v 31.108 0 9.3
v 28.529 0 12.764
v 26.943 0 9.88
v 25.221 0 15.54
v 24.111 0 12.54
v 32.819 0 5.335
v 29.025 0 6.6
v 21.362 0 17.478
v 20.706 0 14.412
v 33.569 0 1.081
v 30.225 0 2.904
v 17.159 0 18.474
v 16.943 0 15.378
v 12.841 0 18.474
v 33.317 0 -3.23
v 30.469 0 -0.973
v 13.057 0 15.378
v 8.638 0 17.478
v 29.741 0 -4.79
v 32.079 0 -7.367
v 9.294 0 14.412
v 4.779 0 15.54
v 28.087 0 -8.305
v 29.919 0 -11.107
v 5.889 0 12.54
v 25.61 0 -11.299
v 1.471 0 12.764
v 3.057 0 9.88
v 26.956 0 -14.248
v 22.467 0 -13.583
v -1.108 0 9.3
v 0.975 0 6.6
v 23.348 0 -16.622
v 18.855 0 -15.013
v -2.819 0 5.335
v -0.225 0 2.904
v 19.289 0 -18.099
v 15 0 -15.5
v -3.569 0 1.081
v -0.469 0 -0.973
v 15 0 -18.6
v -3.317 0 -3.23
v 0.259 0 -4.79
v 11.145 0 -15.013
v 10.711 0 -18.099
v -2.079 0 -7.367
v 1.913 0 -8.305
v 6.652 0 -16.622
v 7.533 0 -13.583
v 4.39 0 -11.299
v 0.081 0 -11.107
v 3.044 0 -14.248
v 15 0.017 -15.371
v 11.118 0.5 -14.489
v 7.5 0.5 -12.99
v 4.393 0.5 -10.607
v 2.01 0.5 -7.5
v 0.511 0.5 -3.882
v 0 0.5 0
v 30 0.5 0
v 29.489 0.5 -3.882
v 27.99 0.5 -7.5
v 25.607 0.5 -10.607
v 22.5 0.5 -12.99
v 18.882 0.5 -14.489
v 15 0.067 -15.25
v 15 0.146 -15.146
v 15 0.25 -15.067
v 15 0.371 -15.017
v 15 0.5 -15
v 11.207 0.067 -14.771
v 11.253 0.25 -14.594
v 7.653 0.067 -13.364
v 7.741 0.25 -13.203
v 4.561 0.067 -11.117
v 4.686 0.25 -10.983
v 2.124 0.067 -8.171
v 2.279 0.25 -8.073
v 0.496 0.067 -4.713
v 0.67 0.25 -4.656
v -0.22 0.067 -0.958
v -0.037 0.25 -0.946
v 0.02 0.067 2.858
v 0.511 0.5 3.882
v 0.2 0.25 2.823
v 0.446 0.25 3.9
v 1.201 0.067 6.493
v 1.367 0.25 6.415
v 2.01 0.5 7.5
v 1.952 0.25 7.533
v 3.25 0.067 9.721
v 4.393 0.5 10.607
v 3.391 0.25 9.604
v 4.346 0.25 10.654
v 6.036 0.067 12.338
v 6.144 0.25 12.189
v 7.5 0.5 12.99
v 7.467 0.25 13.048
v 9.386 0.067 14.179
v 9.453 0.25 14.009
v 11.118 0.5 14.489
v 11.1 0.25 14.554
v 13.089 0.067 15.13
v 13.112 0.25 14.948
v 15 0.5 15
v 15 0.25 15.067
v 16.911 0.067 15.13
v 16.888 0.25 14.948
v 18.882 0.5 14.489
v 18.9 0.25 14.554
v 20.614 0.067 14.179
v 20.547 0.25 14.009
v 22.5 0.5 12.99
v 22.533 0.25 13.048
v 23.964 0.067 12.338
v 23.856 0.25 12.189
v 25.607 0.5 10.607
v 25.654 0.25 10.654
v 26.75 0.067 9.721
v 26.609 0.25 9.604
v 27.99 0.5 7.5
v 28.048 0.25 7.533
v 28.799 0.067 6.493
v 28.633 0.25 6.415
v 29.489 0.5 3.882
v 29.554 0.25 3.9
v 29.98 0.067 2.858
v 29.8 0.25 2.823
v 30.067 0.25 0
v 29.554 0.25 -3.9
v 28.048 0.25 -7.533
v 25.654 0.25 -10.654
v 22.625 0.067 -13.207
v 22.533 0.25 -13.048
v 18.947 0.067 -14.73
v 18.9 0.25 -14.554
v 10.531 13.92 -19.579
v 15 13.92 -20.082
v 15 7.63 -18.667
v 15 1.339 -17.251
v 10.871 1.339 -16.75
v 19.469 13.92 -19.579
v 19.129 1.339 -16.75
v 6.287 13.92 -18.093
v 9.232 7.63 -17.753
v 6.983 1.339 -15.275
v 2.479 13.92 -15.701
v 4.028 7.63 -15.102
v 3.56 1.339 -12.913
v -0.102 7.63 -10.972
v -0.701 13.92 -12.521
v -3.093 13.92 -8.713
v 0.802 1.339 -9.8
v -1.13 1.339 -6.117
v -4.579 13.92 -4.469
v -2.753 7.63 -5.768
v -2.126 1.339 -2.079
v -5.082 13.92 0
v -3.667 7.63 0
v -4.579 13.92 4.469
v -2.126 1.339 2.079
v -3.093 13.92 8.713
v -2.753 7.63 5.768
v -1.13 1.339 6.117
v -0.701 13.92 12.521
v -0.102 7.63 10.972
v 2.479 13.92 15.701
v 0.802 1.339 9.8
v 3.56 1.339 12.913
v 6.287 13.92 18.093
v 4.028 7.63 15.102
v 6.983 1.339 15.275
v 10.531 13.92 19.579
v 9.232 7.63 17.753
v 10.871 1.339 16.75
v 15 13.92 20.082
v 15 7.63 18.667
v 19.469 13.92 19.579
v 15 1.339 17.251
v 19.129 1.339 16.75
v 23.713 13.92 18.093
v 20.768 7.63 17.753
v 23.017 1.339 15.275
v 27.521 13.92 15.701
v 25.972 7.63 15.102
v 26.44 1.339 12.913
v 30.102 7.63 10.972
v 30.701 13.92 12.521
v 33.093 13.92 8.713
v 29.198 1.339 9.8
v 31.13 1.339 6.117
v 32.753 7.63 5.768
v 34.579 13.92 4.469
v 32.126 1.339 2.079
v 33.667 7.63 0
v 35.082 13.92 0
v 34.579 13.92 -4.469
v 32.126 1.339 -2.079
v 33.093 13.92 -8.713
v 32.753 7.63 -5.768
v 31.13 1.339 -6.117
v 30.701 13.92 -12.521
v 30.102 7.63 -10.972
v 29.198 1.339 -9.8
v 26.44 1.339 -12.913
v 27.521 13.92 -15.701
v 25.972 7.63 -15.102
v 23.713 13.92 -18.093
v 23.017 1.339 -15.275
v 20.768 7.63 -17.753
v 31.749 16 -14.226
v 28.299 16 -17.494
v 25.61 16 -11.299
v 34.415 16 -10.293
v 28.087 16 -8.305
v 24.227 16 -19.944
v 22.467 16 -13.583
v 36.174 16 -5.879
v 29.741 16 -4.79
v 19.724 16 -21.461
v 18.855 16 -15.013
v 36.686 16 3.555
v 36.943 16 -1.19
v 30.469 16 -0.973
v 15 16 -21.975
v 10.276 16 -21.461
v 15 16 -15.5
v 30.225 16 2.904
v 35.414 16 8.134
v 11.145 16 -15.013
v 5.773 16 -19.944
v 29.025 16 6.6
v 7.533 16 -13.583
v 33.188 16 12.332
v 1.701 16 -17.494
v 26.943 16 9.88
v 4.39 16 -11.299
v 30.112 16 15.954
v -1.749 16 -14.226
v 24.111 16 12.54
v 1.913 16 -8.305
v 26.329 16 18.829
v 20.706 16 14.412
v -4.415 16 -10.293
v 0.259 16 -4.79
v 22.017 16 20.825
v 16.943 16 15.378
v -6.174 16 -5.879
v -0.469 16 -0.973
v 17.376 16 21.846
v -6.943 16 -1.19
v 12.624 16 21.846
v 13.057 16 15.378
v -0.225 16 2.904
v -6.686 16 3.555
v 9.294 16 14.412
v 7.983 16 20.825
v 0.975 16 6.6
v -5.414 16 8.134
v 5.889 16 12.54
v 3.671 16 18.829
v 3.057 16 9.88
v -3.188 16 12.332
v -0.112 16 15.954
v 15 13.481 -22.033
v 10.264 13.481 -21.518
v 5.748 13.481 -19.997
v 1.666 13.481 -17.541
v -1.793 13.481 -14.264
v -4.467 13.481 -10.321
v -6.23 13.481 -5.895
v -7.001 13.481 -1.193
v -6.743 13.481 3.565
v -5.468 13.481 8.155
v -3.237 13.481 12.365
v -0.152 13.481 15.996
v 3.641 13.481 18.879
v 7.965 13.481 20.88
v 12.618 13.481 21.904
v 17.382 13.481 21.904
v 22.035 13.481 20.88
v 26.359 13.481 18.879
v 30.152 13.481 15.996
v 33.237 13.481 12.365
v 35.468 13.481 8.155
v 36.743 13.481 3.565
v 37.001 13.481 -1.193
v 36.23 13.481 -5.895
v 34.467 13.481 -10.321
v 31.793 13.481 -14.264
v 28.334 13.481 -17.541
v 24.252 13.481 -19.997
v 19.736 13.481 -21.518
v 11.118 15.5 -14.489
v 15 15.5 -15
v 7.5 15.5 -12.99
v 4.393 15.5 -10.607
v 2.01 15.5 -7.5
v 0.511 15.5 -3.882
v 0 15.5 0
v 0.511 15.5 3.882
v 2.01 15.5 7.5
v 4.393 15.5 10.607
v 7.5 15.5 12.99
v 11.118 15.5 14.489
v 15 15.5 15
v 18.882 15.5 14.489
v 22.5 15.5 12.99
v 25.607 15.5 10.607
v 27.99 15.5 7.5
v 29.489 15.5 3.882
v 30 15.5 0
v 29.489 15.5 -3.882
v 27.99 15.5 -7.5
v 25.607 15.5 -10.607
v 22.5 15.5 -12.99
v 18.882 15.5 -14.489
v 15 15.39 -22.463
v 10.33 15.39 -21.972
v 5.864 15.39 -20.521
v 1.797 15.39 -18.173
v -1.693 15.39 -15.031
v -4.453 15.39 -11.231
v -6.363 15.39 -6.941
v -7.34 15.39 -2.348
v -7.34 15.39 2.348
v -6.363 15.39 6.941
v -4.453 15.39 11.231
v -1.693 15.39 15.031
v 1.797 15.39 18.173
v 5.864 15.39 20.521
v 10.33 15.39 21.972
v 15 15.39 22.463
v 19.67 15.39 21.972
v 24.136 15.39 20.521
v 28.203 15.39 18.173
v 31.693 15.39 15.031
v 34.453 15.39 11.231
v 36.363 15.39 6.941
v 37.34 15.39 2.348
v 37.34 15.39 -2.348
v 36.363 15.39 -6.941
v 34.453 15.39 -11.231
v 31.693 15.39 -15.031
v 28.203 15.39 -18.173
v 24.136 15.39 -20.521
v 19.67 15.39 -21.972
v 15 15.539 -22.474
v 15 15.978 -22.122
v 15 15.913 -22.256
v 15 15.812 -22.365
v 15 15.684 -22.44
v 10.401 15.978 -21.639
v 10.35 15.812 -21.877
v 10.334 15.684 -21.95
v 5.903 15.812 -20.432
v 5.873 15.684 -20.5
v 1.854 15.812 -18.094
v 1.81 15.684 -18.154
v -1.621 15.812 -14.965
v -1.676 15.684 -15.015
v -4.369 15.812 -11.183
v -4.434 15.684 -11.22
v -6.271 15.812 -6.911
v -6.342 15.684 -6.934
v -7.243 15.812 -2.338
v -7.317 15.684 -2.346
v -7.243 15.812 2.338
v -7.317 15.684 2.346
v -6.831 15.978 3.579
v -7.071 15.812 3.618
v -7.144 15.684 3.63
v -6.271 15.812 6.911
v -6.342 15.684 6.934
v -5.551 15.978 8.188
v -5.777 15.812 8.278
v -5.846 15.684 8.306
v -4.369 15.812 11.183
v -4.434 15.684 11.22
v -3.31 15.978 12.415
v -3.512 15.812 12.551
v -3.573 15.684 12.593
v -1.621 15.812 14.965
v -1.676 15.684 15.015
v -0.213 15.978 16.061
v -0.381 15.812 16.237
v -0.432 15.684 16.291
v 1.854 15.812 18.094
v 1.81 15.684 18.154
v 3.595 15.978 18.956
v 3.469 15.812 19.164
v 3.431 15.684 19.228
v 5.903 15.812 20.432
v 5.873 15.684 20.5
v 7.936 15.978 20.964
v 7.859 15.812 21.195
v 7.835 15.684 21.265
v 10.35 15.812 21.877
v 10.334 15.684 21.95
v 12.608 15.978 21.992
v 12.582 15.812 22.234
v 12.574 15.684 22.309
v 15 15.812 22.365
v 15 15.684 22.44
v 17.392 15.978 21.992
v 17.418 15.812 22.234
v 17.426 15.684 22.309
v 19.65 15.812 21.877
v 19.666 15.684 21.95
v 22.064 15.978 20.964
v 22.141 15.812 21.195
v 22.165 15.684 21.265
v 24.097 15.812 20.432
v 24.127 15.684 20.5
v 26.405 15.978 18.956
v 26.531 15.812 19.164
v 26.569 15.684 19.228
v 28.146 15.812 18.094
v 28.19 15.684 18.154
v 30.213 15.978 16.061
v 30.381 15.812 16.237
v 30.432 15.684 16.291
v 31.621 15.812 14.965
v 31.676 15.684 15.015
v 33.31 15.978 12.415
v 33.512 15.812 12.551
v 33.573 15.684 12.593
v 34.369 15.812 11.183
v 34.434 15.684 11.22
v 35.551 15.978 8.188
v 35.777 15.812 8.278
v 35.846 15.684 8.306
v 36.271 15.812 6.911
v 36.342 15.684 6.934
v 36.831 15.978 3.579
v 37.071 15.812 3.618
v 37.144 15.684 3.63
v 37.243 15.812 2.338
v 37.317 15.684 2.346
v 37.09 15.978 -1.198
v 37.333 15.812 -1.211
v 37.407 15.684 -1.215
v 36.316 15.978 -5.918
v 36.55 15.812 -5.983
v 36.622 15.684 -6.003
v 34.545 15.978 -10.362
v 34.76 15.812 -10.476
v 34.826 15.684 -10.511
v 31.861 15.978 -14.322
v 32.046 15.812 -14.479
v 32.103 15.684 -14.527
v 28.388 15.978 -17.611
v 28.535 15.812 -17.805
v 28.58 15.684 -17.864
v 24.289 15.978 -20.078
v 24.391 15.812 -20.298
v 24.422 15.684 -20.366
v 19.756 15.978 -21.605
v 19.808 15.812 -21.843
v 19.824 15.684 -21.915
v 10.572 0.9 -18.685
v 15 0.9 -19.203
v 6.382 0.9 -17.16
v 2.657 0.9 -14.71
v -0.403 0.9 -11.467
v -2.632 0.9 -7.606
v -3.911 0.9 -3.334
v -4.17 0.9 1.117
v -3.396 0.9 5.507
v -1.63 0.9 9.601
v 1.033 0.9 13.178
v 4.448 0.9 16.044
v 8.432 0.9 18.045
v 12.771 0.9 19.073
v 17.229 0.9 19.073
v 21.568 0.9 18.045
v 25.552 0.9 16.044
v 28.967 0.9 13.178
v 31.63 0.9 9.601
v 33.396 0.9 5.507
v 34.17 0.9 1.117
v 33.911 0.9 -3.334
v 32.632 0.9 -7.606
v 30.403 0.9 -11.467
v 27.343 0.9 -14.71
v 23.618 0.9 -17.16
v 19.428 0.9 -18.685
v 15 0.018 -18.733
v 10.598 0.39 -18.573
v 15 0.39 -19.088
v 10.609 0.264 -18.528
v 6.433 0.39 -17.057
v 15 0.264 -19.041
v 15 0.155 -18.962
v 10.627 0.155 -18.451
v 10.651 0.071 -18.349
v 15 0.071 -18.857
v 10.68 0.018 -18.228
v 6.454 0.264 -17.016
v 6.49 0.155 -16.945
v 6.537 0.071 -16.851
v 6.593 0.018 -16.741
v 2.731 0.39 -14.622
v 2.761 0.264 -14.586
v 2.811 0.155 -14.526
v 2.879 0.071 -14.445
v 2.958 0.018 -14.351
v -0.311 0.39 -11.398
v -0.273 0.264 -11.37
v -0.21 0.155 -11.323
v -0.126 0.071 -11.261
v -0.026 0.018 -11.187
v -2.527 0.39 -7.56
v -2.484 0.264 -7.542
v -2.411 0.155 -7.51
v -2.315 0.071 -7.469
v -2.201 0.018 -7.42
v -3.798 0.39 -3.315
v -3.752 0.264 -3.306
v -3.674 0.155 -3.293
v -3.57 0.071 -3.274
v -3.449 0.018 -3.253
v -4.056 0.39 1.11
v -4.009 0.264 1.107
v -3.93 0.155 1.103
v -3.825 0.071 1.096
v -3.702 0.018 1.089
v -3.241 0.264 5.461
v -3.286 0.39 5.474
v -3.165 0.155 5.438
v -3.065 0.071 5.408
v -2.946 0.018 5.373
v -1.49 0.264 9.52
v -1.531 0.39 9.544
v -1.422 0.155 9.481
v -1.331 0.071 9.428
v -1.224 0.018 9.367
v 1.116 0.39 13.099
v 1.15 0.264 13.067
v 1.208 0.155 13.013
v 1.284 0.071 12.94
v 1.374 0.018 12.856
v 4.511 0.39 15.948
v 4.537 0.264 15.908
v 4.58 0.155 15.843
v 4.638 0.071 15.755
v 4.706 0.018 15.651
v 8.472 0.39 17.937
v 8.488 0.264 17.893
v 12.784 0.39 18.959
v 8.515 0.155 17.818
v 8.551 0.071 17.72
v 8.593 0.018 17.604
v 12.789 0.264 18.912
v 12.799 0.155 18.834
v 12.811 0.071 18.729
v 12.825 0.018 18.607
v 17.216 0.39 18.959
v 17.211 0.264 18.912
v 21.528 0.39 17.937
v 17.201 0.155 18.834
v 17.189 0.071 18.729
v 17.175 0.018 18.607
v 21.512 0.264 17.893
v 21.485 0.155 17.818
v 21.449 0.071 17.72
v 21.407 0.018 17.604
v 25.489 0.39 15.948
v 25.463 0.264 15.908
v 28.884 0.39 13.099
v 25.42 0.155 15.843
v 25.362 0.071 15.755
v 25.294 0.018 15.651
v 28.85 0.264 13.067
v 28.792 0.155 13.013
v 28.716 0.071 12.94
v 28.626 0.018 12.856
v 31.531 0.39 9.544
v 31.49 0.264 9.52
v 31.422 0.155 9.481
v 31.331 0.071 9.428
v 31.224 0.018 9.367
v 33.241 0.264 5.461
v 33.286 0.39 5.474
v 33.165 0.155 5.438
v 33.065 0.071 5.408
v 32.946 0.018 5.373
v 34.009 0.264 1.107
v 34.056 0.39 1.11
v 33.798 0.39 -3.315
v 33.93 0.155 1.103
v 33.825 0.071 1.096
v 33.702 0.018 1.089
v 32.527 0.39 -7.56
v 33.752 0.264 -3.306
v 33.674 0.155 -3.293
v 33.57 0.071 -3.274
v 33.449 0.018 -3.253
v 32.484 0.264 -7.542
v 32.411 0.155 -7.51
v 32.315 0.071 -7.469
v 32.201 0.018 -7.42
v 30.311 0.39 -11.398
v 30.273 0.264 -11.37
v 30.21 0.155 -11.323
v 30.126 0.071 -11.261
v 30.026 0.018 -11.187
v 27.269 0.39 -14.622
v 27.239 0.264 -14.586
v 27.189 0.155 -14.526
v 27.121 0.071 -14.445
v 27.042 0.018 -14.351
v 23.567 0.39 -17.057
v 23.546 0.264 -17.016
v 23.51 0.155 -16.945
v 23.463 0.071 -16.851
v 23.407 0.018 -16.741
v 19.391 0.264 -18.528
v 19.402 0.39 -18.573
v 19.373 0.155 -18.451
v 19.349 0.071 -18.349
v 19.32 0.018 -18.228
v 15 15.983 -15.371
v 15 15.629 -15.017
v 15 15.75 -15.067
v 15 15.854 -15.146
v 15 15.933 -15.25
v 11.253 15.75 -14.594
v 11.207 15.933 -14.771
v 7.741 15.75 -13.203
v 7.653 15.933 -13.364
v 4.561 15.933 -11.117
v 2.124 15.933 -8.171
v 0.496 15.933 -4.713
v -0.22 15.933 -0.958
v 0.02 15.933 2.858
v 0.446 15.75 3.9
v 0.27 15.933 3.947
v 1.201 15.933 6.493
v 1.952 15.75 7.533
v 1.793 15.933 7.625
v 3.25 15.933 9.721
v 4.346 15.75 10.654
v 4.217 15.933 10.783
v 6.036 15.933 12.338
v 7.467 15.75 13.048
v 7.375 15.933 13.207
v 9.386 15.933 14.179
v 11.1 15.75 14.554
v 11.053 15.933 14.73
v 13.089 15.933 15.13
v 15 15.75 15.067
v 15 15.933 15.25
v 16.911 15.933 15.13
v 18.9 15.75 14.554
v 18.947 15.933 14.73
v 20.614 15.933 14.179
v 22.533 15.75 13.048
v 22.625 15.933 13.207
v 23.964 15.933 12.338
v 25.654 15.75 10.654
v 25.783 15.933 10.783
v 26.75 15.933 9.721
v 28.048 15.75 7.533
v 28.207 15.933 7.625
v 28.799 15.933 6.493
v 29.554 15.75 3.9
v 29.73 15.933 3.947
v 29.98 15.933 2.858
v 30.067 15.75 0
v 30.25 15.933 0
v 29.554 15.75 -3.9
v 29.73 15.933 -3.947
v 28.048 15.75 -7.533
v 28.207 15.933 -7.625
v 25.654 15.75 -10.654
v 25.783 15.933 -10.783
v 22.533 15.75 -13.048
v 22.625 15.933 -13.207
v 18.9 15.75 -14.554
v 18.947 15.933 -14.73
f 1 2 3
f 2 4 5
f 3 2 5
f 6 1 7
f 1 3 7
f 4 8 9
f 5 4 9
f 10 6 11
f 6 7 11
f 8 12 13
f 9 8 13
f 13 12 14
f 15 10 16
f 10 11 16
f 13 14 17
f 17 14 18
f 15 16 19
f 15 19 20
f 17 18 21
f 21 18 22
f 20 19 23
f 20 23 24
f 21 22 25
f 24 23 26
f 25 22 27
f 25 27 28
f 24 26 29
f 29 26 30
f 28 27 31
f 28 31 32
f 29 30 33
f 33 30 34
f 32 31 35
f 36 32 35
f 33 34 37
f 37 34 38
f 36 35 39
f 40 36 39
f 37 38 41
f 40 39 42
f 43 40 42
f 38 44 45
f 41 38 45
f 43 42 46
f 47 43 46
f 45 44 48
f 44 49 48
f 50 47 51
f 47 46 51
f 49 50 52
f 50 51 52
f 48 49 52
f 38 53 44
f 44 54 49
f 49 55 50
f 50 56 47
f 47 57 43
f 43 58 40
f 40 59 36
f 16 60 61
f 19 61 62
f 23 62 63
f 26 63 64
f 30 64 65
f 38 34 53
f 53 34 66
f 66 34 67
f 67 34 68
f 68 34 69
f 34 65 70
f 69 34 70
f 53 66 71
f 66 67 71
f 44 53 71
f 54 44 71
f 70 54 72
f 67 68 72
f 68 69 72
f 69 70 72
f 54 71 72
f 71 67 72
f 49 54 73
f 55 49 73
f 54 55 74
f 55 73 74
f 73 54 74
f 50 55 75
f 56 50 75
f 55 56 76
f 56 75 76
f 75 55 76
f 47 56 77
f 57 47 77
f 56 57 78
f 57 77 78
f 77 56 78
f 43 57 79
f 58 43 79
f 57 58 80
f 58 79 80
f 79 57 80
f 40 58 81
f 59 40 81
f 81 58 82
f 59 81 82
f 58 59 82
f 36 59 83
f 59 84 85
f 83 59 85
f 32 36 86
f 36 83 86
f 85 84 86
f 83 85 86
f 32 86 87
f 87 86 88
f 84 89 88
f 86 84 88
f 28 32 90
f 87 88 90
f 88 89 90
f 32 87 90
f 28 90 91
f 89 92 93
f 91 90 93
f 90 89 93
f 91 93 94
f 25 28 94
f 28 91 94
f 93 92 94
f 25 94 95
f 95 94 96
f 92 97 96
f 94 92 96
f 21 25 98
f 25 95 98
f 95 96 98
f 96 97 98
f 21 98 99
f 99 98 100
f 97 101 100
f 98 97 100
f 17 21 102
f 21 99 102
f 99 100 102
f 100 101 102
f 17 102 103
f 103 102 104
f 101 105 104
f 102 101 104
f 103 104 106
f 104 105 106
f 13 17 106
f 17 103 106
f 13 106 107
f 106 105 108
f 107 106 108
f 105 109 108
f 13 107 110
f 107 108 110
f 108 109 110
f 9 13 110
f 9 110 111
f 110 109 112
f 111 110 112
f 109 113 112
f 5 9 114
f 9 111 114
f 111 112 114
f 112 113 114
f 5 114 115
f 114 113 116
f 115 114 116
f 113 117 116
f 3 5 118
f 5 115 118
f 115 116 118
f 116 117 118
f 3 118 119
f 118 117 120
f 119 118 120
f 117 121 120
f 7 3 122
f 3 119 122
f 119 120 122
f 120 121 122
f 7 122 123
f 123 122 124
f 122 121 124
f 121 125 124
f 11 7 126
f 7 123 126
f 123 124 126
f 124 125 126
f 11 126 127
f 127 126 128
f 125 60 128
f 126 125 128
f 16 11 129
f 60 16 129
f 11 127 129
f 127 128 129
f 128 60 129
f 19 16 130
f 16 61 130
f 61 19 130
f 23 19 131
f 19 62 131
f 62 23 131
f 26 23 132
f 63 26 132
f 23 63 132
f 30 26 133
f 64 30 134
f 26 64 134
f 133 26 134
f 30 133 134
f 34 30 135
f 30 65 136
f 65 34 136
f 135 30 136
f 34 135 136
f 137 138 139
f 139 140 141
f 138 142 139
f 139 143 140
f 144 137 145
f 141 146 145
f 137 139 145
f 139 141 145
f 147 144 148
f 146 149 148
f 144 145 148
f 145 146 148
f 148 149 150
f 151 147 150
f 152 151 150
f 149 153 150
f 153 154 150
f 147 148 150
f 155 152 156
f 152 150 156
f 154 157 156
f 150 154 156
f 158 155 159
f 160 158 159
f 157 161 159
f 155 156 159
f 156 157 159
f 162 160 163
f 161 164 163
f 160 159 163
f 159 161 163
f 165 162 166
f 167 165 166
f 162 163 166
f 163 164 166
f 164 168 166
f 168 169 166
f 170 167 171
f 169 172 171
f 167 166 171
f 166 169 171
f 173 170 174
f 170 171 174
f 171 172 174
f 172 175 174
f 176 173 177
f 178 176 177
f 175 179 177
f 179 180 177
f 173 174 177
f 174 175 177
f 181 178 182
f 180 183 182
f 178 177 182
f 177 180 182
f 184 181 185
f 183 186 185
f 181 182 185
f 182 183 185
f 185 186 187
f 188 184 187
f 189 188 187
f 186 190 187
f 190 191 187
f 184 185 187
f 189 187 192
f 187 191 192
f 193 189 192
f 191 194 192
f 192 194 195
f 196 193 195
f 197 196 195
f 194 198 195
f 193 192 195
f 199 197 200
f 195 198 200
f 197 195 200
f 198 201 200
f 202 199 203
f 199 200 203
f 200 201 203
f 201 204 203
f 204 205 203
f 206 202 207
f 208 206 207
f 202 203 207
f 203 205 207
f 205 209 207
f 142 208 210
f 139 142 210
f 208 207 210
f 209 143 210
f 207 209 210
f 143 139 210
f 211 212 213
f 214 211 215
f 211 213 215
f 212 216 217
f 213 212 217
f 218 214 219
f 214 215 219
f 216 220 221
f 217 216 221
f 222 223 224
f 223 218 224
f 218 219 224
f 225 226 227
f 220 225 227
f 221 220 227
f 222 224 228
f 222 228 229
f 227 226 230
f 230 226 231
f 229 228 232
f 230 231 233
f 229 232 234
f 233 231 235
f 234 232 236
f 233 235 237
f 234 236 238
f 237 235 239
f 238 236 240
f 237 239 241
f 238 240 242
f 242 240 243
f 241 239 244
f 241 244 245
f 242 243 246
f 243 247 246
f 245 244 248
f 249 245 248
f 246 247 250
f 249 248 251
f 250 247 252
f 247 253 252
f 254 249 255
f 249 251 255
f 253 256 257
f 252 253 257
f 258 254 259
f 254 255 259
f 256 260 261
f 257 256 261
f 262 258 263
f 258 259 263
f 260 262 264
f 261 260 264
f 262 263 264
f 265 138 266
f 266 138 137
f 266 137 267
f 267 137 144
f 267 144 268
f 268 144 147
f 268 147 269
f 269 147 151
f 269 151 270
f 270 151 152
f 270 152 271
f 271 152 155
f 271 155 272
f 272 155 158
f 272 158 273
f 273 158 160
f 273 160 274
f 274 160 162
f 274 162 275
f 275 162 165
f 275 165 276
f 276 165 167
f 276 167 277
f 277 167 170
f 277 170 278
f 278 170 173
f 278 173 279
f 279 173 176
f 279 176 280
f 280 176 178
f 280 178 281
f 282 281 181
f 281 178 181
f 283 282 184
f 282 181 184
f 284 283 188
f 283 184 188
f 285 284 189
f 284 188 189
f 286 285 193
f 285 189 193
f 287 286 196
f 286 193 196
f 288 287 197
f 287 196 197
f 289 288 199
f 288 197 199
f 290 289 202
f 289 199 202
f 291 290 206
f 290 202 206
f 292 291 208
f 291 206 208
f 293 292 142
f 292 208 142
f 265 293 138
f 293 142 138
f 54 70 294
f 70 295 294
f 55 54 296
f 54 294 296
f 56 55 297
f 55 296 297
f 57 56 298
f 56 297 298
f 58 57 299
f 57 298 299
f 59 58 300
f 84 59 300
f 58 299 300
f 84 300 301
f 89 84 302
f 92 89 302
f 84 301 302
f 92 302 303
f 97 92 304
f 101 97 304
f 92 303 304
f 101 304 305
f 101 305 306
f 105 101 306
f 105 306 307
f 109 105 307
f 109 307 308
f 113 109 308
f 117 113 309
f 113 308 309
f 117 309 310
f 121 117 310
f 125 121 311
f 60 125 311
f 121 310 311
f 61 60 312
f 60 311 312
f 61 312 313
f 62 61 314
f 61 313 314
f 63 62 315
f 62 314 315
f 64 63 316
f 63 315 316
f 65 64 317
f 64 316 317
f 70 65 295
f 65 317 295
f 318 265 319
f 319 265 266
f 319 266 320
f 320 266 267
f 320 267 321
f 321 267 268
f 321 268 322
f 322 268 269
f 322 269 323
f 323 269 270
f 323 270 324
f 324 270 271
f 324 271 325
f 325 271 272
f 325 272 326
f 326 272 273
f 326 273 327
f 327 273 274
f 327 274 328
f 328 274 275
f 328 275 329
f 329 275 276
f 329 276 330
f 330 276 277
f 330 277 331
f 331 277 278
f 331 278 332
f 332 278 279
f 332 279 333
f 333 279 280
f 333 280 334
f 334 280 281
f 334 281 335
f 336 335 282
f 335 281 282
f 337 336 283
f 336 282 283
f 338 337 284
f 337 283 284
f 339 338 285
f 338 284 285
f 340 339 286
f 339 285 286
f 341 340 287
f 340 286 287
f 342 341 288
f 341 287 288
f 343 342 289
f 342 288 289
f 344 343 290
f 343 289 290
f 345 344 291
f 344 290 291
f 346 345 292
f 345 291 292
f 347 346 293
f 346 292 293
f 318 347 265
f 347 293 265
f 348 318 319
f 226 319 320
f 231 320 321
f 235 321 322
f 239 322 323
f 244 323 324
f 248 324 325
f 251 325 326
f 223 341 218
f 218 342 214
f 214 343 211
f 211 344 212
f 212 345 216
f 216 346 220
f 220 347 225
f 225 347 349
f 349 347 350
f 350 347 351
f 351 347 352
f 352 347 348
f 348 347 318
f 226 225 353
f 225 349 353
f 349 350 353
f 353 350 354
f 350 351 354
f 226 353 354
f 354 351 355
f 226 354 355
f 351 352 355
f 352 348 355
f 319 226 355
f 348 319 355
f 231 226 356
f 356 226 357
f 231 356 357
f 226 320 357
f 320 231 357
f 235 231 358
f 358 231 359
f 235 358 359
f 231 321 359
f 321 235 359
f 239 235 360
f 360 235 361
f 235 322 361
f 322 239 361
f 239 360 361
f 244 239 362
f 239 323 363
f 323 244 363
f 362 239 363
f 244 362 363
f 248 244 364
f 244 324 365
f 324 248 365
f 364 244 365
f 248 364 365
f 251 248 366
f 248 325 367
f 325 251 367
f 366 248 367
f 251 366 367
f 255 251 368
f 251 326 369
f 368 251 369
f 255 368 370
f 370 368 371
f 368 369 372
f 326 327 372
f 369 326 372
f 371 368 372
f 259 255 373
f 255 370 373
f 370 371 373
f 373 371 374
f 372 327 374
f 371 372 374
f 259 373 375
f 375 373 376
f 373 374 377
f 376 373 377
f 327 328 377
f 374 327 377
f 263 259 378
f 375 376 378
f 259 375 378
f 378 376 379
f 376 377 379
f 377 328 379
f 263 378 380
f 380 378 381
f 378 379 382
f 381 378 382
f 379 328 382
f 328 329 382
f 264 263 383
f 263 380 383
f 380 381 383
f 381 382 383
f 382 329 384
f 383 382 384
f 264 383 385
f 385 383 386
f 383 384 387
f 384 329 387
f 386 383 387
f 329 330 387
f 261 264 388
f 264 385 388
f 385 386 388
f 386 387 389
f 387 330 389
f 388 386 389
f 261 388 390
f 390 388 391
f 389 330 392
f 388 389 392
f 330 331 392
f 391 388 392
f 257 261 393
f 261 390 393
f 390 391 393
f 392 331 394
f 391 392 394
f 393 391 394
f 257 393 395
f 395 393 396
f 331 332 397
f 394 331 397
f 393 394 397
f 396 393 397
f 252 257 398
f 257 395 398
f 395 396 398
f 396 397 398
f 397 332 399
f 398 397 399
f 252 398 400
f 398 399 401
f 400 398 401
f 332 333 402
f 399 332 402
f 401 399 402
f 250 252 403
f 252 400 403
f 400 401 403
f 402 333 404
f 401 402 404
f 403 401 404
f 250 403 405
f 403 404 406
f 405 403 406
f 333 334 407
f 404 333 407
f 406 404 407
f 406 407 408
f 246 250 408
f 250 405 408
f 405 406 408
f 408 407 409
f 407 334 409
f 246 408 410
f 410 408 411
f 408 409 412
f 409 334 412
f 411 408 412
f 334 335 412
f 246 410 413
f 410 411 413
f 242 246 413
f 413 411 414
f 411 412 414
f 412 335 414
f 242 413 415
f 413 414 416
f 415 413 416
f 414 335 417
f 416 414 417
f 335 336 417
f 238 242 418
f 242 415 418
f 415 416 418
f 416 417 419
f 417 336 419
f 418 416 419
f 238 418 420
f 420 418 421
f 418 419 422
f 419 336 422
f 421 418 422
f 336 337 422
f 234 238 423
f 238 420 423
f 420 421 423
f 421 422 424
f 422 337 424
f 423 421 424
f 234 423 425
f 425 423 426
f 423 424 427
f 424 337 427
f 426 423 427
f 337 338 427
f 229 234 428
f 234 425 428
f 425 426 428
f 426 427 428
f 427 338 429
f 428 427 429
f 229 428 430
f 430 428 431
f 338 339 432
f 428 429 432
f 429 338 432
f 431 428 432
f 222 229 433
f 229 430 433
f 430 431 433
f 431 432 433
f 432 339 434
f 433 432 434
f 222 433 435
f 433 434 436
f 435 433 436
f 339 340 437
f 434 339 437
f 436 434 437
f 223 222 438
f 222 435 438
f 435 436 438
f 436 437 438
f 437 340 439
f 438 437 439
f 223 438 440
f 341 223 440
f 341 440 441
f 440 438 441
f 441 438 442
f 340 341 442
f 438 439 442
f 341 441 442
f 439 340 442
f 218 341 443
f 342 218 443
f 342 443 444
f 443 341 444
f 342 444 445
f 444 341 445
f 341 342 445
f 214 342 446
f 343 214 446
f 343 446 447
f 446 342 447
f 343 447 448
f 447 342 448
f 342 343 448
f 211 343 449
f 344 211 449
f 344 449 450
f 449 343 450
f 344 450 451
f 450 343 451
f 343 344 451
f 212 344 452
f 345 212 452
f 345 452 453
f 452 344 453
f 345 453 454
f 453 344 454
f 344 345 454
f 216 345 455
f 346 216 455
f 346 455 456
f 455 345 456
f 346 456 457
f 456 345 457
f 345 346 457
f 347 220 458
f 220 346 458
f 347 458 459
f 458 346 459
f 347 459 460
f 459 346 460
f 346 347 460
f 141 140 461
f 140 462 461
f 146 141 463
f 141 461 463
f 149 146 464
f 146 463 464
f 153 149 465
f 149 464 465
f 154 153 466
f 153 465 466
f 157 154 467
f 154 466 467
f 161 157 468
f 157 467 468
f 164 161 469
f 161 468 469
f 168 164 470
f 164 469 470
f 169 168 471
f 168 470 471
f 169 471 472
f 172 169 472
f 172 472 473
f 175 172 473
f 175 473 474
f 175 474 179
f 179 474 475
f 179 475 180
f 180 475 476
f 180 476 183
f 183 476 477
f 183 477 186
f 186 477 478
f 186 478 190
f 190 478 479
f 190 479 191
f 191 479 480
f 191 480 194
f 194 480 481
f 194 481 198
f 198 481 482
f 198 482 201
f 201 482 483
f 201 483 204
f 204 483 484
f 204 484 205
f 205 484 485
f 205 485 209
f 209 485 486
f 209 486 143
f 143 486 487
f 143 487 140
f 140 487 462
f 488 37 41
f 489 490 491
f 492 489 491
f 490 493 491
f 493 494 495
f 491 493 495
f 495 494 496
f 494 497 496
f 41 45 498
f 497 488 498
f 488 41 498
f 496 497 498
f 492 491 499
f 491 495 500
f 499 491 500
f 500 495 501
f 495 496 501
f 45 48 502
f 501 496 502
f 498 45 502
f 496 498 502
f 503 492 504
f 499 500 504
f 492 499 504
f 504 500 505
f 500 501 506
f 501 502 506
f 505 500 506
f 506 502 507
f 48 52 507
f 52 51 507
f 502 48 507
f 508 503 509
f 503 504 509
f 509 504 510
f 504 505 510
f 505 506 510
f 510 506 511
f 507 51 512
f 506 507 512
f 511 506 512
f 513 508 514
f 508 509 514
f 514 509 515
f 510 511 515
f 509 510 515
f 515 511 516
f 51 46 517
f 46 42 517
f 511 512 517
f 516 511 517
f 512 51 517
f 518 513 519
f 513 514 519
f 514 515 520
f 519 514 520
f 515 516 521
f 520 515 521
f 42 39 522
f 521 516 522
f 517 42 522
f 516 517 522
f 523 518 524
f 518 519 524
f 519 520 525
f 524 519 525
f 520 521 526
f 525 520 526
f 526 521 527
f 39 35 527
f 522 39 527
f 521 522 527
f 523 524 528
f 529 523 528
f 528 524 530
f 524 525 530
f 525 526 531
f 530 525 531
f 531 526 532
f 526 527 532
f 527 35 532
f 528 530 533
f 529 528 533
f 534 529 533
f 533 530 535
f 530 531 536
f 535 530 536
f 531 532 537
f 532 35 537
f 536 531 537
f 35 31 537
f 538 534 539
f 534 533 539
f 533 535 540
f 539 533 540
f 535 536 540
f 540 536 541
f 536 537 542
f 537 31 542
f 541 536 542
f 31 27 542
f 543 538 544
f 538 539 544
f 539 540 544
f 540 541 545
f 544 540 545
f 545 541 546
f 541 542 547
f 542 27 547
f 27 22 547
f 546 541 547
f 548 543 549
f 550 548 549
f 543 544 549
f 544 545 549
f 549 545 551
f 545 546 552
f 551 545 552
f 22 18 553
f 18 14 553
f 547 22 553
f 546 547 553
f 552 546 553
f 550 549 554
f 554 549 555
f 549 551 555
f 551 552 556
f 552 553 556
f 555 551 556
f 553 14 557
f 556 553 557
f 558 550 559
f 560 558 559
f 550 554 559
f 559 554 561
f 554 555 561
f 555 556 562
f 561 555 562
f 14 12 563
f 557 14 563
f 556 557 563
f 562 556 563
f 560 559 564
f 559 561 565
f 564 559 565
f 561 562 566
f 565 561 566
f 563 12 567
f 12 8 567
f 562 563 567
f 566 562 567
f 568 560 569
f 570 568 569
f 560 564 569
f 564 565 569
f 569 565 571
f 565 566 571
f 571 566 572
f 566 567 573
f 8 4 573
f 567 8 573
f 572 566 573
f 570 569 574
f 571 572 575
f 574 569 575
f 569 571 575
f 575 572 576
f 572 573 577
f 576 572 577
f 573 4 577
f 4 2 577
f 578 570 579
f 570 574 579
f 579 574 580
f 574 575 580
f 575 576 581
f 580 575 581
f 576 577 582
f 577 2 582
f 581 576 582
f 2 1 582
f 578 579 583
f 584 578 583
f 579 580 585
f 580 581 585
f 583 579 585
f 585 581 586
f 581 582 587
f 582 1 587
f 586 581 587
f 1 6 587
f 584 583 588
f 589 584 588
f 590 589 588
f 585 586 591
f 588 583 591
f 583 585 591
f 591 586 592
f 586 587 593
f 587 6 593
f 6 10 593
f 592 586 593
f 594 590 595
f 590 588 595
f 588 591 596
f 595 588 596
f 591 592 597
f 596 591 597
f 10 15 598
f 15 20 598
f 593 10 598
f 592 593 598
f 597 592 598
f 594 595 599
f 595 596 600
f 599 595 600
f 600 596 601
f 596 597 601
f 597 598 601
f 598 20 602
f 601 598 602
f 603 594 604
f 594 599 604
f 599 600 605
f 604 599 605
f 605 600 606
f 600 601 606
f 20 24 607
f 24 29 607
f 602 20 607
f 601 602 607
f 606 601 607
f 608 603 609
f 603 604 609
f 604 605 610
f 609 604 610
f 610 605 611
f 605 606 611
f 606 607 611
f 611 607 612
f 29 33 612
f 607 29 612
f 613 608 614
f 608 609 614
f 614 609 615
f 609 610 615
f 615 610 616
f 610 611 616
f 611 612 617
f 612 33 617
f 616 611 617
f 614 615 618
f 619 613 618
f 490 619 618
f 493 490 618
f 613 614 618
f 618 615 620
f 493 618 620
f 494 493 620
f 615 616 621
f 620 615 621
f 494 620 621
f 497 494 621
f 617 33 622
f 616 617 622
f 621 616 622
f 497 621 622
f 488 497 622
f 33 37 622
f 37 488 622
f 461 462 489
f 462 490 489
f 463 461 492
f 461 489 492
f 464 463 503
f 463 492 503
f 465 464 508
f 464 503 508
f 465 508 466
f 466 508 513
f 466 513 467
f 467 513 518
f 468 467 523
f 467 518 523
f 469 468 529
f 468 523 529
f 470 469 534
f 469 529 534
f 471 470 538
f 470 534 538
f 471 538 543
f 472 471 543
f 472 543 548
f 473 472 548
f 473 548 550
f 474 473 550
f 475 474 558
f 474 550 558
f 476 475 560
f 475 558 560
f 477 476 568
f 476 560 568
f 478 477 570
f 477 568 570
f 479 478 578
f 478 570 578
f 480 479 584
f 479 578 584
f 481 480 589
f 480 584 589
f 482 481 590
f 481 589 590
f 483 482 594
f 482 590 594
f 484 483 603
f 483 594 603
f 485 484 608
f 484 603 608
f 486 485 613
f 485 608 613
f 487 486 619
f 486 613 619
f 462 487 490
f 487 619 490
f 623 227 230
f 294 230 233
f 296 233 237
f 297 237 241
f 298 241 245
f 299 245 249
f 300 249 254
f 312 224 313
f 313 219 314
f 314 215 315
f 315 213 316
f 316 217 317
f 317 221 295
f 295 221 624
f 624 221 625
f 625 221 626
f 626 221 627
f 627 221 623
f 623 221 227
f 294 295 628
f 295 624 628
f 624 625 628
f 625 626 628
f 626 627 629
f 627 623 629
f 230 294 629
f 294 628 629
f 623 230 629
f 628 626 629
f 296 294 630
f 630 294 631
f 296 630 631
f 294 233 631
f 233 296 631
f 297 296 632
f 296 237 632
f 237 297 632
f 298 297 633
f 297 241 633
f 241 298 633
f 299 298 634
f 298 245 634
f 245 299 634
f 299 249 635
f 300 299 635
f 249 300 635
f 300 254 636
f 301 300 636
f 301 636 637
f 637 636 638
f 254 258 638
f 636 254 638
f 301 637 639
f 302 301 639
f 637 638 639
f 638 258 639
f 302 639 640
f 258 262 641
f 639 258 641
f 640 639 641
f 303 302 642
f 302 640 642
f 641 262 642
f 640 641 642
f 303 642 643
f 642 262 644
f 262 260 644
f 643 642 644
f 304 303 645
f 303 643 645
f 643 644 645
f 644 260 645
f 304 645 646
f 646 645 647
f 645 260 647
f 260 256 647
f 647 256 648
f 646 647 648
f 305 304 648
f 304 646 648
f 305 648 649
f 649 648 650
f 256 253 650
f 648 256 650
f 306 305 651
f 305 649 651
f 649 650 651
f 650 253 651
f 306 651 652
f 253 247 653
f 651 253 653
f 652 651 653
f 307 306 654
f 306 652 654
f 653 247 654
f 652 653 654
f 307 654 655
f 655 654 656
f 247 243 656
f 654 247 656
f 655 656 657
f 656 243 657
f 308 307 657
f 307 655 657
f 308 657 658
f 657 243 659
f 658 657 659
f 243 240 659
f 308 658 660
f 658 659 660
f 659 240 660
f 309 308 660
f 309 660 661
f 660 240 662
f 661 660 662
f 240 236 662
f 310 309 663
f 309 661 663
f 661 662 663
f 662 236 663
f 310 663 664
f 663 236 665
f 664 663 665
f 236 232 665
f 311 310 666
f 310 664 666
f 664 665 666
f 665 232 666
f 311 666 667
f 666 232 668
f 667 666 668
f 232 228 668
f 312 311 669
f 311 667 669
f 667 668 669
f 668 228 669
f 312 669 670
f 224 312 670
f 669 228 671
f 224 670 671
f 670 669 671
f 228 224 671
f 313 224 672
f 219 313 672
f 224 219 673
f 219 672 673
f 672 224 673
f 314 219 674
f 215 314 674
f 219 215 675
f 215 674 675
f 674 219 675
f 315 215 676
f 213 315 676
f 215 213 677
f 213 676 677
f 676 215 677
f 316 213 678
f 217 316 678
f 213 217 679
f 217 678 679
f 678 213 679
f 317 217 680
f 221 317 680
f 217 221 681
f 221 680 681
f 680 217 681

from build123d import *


with BuildPart() as part:
    # Çizim1 → Döndür1 (revolve)
    with BuildSketch(Plane.XY, mode=Mode.PRIVATE) as d_nd_r1_sk:
        with BuildLine():
            Line((0, 0.5), (0, 15.5))
            ThreePointArc((0, 15.5), (-0.146446609, 15.853553391), (-0.5, 16))
            Line((-0.5, 16), (-6.975, 16))
            ThreePointArc((-6.975, 16), (-7.365434405, 15.812347524), (-7.462804878, 15.390243902))
            Line((-7.462804878, 15.390243902), (-7.033242887, 13.481079498))
            Line((-7.033242887, 13.481079498), (-5.082023375, 13.920103888))
            Line((-5.082023375, 13.920103888), (-2.251352946, 1.339346427))
            Line((-2.251352946, 1.339346427), (-4.202572458, 0.900322037))
            Line((-4.202572458, 0.900322037), (-4.087804878, 0.390243902))
            ThreePointArc((-4.087804878, 0.390243902), (-3.912347524, 0.109565595), (-3.6, 0))
            Line((-3.6, 0), (-0.5, 0))
            ThreePointArc((-0.5, 0), (-0.146446609, 0.146446609), (0, 0.5))
        make_face()
    revolve(d_nd_r1_sk.sketch.rotate(Axis((15, 1.339346427, 0), (0, 1, 0)), 270), axis=Axis((15, 1.339346427, 0), (0, 1, 0)))


solid = part.part
